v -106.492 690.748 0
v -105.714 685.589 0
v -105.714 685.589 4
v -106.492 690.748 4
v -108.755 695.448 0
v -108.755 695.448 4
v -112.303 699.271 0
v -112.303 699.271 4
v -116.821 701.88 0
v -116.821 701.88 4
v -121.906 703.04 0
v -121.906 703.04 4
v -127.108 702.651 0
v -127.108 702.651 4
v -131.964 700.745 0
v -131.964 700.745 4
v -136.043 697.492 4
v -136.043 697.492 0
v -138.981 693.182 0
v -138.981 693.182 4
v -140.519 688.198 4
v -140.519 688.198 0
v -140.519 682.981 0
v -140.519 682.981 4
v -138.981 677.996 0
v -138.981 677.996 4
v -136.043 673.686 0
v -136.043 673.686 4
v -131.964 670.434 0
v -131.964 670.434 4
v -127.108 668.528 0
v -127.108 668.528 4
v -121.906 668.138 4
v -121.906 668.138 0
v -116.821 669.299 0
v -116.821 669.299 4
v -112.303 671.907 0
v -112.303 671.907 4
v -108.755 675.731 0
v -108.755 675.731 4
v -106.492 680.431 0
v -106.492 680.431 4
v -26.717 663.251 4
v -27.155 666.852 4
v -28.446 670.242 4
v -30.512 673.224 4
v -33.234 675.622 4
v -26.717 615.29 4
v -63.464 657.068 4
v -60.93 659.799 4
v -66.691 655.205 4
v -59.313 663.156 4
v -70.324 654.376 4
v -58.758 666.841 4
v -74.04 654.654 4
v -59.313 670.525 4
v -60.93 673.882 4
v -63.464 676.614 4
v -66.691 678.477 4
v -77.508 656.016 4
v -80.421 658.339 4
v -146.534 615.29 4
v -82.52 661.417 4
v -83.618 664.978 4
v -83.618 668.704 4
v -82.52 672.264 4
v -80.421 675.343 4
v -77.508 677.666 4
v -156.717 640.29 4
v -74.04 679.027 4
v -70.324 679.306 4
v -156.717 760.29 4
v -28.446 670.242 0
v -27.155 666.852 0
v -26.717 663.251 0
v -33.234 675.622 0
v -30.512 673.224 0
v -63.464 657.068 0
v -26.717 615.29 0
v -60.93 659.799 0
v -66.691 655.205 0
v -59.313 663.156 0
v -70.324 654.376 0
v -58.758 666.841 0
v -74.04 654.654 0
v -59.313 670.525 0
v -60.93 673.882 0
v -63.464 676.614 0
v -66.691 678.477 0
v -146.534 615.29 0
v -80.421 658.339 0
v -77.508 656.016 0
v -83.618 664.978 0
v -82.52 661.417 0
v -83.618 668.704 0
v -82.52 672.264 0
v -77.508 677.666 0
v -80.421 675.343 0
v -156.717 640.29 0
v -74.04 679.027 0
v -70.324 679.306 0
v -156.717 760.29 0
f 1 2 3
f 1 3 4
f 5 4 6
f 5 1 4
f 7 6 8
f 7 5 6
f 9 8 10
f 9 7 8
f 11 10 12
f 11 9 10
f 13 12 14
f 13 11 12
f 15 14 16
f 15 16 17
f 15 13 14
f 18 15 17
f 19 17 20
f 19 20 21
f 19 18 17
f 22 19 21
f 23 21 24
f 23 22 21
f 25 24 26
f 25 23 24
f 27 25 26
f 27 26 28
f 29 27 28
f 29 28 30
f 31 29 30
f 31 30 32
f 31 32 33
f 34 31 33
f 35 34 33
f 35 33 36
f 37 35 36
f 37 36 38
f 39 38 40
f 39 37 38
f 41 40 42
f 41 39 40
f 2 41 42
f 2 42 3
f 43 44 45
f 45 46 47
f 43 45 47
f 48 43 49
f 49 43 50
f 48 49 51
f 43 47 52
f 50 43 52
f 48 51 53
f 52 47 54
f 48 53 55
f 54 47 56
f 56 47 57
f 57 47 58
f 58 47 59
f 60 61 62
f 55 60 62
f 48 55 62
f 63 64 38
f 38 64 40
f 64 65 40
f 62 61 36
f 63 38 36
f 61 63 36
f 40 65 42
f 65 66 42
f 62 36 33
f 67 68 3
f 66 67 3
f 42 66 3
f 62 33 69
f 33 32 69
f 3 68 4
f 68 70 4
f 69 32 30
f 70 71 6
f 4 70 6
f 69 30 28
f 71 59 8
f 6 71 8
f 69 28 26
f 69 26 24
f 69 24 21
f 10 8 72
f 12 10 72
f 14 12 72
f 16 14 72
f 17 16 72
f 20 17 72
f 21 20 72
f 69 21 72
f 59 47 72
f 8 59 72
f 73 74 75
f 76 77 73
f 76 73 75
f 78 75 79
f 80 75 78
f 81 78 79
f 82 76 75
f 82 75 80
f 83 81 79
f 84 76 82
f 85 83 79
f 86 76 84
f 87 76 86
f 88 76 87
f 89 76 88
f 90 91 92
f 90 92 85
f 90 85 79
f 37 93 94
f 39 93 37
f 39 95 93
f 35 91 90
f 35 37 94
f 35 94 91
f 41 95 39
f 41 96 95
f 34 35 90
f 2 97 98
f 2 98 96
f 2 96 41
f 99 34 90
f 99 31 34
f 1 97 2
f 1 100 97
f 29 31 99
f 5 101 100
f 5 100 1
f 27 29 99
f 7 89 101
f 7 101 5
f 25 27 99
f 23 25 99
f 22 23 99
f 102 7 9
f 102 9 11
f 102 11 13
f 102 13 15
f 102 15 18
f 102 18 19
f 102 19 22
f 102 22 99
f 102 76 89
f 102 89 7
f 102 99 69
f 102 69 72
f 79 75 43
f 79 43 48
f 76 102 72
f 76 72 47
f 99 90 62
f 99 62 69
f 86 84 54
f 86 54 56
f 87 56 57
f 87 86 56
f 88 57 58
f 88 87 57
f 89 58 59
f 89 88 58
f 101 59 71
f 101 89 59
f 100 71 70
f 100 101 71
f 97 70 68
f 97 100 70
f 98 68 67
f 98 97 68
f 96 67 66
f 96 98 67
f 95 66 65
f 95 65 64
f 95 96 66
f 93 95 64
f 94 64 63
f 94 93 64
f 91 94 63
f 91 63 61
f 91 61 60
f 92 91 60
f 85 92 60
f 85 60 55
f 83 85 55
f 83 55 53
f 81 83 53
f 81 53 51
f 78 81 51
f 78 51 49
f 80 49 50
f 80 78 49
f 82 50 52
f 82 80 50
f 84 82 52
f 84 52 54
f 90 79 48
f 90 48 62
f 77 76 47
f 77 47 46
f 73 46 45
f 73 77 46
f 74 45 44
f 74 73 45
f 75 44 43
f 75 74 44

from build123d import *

# Parameters (mm, degrees)
SKETCH_1_R      = 17.5
SKETCH_1_R_2    = 12.5
EXTRUDE_1_DEPTH = 4


with BuildPart() as part:
    # 草图1 → 凸台-拉伸1 (new body)
    with BuildSketch(Plane.XY):
        with BuildLine():
            Line((-26.716521465, 615.290207127), (-146.53444515, 615.290207127))
            Line((-146.53444515, 615.290207127), (-156.716521465, 640.290207127))
            Line((-156.716521465, 640.290207127), (-156.716521465, 760.290207127))
            Line((-156.716521465, 760.290207127), (-33.233977794, 675.622063649))
            ThreePointArc((-33.233977794, 675.622063649), (-28.445535159, 670.242358457), (-26.716521465, 663.250869168))
            Line((-26.716521465, 663.250869168), (-26.716521465, 615.290207127))
        make_face()
        with Locations((-123.214216797, 685.589410404)):
            Circle(SKETCH_1_R, mode=Mode.SUBTRACT)
        with Locations((-71.258091401, 666.840828083)):
            Circle(SKETCH_1_R_2, mode=Mode.SUBTRACT)
    extrude(amount=EXTRUDE_1_DEPTH)


solid = part.part
